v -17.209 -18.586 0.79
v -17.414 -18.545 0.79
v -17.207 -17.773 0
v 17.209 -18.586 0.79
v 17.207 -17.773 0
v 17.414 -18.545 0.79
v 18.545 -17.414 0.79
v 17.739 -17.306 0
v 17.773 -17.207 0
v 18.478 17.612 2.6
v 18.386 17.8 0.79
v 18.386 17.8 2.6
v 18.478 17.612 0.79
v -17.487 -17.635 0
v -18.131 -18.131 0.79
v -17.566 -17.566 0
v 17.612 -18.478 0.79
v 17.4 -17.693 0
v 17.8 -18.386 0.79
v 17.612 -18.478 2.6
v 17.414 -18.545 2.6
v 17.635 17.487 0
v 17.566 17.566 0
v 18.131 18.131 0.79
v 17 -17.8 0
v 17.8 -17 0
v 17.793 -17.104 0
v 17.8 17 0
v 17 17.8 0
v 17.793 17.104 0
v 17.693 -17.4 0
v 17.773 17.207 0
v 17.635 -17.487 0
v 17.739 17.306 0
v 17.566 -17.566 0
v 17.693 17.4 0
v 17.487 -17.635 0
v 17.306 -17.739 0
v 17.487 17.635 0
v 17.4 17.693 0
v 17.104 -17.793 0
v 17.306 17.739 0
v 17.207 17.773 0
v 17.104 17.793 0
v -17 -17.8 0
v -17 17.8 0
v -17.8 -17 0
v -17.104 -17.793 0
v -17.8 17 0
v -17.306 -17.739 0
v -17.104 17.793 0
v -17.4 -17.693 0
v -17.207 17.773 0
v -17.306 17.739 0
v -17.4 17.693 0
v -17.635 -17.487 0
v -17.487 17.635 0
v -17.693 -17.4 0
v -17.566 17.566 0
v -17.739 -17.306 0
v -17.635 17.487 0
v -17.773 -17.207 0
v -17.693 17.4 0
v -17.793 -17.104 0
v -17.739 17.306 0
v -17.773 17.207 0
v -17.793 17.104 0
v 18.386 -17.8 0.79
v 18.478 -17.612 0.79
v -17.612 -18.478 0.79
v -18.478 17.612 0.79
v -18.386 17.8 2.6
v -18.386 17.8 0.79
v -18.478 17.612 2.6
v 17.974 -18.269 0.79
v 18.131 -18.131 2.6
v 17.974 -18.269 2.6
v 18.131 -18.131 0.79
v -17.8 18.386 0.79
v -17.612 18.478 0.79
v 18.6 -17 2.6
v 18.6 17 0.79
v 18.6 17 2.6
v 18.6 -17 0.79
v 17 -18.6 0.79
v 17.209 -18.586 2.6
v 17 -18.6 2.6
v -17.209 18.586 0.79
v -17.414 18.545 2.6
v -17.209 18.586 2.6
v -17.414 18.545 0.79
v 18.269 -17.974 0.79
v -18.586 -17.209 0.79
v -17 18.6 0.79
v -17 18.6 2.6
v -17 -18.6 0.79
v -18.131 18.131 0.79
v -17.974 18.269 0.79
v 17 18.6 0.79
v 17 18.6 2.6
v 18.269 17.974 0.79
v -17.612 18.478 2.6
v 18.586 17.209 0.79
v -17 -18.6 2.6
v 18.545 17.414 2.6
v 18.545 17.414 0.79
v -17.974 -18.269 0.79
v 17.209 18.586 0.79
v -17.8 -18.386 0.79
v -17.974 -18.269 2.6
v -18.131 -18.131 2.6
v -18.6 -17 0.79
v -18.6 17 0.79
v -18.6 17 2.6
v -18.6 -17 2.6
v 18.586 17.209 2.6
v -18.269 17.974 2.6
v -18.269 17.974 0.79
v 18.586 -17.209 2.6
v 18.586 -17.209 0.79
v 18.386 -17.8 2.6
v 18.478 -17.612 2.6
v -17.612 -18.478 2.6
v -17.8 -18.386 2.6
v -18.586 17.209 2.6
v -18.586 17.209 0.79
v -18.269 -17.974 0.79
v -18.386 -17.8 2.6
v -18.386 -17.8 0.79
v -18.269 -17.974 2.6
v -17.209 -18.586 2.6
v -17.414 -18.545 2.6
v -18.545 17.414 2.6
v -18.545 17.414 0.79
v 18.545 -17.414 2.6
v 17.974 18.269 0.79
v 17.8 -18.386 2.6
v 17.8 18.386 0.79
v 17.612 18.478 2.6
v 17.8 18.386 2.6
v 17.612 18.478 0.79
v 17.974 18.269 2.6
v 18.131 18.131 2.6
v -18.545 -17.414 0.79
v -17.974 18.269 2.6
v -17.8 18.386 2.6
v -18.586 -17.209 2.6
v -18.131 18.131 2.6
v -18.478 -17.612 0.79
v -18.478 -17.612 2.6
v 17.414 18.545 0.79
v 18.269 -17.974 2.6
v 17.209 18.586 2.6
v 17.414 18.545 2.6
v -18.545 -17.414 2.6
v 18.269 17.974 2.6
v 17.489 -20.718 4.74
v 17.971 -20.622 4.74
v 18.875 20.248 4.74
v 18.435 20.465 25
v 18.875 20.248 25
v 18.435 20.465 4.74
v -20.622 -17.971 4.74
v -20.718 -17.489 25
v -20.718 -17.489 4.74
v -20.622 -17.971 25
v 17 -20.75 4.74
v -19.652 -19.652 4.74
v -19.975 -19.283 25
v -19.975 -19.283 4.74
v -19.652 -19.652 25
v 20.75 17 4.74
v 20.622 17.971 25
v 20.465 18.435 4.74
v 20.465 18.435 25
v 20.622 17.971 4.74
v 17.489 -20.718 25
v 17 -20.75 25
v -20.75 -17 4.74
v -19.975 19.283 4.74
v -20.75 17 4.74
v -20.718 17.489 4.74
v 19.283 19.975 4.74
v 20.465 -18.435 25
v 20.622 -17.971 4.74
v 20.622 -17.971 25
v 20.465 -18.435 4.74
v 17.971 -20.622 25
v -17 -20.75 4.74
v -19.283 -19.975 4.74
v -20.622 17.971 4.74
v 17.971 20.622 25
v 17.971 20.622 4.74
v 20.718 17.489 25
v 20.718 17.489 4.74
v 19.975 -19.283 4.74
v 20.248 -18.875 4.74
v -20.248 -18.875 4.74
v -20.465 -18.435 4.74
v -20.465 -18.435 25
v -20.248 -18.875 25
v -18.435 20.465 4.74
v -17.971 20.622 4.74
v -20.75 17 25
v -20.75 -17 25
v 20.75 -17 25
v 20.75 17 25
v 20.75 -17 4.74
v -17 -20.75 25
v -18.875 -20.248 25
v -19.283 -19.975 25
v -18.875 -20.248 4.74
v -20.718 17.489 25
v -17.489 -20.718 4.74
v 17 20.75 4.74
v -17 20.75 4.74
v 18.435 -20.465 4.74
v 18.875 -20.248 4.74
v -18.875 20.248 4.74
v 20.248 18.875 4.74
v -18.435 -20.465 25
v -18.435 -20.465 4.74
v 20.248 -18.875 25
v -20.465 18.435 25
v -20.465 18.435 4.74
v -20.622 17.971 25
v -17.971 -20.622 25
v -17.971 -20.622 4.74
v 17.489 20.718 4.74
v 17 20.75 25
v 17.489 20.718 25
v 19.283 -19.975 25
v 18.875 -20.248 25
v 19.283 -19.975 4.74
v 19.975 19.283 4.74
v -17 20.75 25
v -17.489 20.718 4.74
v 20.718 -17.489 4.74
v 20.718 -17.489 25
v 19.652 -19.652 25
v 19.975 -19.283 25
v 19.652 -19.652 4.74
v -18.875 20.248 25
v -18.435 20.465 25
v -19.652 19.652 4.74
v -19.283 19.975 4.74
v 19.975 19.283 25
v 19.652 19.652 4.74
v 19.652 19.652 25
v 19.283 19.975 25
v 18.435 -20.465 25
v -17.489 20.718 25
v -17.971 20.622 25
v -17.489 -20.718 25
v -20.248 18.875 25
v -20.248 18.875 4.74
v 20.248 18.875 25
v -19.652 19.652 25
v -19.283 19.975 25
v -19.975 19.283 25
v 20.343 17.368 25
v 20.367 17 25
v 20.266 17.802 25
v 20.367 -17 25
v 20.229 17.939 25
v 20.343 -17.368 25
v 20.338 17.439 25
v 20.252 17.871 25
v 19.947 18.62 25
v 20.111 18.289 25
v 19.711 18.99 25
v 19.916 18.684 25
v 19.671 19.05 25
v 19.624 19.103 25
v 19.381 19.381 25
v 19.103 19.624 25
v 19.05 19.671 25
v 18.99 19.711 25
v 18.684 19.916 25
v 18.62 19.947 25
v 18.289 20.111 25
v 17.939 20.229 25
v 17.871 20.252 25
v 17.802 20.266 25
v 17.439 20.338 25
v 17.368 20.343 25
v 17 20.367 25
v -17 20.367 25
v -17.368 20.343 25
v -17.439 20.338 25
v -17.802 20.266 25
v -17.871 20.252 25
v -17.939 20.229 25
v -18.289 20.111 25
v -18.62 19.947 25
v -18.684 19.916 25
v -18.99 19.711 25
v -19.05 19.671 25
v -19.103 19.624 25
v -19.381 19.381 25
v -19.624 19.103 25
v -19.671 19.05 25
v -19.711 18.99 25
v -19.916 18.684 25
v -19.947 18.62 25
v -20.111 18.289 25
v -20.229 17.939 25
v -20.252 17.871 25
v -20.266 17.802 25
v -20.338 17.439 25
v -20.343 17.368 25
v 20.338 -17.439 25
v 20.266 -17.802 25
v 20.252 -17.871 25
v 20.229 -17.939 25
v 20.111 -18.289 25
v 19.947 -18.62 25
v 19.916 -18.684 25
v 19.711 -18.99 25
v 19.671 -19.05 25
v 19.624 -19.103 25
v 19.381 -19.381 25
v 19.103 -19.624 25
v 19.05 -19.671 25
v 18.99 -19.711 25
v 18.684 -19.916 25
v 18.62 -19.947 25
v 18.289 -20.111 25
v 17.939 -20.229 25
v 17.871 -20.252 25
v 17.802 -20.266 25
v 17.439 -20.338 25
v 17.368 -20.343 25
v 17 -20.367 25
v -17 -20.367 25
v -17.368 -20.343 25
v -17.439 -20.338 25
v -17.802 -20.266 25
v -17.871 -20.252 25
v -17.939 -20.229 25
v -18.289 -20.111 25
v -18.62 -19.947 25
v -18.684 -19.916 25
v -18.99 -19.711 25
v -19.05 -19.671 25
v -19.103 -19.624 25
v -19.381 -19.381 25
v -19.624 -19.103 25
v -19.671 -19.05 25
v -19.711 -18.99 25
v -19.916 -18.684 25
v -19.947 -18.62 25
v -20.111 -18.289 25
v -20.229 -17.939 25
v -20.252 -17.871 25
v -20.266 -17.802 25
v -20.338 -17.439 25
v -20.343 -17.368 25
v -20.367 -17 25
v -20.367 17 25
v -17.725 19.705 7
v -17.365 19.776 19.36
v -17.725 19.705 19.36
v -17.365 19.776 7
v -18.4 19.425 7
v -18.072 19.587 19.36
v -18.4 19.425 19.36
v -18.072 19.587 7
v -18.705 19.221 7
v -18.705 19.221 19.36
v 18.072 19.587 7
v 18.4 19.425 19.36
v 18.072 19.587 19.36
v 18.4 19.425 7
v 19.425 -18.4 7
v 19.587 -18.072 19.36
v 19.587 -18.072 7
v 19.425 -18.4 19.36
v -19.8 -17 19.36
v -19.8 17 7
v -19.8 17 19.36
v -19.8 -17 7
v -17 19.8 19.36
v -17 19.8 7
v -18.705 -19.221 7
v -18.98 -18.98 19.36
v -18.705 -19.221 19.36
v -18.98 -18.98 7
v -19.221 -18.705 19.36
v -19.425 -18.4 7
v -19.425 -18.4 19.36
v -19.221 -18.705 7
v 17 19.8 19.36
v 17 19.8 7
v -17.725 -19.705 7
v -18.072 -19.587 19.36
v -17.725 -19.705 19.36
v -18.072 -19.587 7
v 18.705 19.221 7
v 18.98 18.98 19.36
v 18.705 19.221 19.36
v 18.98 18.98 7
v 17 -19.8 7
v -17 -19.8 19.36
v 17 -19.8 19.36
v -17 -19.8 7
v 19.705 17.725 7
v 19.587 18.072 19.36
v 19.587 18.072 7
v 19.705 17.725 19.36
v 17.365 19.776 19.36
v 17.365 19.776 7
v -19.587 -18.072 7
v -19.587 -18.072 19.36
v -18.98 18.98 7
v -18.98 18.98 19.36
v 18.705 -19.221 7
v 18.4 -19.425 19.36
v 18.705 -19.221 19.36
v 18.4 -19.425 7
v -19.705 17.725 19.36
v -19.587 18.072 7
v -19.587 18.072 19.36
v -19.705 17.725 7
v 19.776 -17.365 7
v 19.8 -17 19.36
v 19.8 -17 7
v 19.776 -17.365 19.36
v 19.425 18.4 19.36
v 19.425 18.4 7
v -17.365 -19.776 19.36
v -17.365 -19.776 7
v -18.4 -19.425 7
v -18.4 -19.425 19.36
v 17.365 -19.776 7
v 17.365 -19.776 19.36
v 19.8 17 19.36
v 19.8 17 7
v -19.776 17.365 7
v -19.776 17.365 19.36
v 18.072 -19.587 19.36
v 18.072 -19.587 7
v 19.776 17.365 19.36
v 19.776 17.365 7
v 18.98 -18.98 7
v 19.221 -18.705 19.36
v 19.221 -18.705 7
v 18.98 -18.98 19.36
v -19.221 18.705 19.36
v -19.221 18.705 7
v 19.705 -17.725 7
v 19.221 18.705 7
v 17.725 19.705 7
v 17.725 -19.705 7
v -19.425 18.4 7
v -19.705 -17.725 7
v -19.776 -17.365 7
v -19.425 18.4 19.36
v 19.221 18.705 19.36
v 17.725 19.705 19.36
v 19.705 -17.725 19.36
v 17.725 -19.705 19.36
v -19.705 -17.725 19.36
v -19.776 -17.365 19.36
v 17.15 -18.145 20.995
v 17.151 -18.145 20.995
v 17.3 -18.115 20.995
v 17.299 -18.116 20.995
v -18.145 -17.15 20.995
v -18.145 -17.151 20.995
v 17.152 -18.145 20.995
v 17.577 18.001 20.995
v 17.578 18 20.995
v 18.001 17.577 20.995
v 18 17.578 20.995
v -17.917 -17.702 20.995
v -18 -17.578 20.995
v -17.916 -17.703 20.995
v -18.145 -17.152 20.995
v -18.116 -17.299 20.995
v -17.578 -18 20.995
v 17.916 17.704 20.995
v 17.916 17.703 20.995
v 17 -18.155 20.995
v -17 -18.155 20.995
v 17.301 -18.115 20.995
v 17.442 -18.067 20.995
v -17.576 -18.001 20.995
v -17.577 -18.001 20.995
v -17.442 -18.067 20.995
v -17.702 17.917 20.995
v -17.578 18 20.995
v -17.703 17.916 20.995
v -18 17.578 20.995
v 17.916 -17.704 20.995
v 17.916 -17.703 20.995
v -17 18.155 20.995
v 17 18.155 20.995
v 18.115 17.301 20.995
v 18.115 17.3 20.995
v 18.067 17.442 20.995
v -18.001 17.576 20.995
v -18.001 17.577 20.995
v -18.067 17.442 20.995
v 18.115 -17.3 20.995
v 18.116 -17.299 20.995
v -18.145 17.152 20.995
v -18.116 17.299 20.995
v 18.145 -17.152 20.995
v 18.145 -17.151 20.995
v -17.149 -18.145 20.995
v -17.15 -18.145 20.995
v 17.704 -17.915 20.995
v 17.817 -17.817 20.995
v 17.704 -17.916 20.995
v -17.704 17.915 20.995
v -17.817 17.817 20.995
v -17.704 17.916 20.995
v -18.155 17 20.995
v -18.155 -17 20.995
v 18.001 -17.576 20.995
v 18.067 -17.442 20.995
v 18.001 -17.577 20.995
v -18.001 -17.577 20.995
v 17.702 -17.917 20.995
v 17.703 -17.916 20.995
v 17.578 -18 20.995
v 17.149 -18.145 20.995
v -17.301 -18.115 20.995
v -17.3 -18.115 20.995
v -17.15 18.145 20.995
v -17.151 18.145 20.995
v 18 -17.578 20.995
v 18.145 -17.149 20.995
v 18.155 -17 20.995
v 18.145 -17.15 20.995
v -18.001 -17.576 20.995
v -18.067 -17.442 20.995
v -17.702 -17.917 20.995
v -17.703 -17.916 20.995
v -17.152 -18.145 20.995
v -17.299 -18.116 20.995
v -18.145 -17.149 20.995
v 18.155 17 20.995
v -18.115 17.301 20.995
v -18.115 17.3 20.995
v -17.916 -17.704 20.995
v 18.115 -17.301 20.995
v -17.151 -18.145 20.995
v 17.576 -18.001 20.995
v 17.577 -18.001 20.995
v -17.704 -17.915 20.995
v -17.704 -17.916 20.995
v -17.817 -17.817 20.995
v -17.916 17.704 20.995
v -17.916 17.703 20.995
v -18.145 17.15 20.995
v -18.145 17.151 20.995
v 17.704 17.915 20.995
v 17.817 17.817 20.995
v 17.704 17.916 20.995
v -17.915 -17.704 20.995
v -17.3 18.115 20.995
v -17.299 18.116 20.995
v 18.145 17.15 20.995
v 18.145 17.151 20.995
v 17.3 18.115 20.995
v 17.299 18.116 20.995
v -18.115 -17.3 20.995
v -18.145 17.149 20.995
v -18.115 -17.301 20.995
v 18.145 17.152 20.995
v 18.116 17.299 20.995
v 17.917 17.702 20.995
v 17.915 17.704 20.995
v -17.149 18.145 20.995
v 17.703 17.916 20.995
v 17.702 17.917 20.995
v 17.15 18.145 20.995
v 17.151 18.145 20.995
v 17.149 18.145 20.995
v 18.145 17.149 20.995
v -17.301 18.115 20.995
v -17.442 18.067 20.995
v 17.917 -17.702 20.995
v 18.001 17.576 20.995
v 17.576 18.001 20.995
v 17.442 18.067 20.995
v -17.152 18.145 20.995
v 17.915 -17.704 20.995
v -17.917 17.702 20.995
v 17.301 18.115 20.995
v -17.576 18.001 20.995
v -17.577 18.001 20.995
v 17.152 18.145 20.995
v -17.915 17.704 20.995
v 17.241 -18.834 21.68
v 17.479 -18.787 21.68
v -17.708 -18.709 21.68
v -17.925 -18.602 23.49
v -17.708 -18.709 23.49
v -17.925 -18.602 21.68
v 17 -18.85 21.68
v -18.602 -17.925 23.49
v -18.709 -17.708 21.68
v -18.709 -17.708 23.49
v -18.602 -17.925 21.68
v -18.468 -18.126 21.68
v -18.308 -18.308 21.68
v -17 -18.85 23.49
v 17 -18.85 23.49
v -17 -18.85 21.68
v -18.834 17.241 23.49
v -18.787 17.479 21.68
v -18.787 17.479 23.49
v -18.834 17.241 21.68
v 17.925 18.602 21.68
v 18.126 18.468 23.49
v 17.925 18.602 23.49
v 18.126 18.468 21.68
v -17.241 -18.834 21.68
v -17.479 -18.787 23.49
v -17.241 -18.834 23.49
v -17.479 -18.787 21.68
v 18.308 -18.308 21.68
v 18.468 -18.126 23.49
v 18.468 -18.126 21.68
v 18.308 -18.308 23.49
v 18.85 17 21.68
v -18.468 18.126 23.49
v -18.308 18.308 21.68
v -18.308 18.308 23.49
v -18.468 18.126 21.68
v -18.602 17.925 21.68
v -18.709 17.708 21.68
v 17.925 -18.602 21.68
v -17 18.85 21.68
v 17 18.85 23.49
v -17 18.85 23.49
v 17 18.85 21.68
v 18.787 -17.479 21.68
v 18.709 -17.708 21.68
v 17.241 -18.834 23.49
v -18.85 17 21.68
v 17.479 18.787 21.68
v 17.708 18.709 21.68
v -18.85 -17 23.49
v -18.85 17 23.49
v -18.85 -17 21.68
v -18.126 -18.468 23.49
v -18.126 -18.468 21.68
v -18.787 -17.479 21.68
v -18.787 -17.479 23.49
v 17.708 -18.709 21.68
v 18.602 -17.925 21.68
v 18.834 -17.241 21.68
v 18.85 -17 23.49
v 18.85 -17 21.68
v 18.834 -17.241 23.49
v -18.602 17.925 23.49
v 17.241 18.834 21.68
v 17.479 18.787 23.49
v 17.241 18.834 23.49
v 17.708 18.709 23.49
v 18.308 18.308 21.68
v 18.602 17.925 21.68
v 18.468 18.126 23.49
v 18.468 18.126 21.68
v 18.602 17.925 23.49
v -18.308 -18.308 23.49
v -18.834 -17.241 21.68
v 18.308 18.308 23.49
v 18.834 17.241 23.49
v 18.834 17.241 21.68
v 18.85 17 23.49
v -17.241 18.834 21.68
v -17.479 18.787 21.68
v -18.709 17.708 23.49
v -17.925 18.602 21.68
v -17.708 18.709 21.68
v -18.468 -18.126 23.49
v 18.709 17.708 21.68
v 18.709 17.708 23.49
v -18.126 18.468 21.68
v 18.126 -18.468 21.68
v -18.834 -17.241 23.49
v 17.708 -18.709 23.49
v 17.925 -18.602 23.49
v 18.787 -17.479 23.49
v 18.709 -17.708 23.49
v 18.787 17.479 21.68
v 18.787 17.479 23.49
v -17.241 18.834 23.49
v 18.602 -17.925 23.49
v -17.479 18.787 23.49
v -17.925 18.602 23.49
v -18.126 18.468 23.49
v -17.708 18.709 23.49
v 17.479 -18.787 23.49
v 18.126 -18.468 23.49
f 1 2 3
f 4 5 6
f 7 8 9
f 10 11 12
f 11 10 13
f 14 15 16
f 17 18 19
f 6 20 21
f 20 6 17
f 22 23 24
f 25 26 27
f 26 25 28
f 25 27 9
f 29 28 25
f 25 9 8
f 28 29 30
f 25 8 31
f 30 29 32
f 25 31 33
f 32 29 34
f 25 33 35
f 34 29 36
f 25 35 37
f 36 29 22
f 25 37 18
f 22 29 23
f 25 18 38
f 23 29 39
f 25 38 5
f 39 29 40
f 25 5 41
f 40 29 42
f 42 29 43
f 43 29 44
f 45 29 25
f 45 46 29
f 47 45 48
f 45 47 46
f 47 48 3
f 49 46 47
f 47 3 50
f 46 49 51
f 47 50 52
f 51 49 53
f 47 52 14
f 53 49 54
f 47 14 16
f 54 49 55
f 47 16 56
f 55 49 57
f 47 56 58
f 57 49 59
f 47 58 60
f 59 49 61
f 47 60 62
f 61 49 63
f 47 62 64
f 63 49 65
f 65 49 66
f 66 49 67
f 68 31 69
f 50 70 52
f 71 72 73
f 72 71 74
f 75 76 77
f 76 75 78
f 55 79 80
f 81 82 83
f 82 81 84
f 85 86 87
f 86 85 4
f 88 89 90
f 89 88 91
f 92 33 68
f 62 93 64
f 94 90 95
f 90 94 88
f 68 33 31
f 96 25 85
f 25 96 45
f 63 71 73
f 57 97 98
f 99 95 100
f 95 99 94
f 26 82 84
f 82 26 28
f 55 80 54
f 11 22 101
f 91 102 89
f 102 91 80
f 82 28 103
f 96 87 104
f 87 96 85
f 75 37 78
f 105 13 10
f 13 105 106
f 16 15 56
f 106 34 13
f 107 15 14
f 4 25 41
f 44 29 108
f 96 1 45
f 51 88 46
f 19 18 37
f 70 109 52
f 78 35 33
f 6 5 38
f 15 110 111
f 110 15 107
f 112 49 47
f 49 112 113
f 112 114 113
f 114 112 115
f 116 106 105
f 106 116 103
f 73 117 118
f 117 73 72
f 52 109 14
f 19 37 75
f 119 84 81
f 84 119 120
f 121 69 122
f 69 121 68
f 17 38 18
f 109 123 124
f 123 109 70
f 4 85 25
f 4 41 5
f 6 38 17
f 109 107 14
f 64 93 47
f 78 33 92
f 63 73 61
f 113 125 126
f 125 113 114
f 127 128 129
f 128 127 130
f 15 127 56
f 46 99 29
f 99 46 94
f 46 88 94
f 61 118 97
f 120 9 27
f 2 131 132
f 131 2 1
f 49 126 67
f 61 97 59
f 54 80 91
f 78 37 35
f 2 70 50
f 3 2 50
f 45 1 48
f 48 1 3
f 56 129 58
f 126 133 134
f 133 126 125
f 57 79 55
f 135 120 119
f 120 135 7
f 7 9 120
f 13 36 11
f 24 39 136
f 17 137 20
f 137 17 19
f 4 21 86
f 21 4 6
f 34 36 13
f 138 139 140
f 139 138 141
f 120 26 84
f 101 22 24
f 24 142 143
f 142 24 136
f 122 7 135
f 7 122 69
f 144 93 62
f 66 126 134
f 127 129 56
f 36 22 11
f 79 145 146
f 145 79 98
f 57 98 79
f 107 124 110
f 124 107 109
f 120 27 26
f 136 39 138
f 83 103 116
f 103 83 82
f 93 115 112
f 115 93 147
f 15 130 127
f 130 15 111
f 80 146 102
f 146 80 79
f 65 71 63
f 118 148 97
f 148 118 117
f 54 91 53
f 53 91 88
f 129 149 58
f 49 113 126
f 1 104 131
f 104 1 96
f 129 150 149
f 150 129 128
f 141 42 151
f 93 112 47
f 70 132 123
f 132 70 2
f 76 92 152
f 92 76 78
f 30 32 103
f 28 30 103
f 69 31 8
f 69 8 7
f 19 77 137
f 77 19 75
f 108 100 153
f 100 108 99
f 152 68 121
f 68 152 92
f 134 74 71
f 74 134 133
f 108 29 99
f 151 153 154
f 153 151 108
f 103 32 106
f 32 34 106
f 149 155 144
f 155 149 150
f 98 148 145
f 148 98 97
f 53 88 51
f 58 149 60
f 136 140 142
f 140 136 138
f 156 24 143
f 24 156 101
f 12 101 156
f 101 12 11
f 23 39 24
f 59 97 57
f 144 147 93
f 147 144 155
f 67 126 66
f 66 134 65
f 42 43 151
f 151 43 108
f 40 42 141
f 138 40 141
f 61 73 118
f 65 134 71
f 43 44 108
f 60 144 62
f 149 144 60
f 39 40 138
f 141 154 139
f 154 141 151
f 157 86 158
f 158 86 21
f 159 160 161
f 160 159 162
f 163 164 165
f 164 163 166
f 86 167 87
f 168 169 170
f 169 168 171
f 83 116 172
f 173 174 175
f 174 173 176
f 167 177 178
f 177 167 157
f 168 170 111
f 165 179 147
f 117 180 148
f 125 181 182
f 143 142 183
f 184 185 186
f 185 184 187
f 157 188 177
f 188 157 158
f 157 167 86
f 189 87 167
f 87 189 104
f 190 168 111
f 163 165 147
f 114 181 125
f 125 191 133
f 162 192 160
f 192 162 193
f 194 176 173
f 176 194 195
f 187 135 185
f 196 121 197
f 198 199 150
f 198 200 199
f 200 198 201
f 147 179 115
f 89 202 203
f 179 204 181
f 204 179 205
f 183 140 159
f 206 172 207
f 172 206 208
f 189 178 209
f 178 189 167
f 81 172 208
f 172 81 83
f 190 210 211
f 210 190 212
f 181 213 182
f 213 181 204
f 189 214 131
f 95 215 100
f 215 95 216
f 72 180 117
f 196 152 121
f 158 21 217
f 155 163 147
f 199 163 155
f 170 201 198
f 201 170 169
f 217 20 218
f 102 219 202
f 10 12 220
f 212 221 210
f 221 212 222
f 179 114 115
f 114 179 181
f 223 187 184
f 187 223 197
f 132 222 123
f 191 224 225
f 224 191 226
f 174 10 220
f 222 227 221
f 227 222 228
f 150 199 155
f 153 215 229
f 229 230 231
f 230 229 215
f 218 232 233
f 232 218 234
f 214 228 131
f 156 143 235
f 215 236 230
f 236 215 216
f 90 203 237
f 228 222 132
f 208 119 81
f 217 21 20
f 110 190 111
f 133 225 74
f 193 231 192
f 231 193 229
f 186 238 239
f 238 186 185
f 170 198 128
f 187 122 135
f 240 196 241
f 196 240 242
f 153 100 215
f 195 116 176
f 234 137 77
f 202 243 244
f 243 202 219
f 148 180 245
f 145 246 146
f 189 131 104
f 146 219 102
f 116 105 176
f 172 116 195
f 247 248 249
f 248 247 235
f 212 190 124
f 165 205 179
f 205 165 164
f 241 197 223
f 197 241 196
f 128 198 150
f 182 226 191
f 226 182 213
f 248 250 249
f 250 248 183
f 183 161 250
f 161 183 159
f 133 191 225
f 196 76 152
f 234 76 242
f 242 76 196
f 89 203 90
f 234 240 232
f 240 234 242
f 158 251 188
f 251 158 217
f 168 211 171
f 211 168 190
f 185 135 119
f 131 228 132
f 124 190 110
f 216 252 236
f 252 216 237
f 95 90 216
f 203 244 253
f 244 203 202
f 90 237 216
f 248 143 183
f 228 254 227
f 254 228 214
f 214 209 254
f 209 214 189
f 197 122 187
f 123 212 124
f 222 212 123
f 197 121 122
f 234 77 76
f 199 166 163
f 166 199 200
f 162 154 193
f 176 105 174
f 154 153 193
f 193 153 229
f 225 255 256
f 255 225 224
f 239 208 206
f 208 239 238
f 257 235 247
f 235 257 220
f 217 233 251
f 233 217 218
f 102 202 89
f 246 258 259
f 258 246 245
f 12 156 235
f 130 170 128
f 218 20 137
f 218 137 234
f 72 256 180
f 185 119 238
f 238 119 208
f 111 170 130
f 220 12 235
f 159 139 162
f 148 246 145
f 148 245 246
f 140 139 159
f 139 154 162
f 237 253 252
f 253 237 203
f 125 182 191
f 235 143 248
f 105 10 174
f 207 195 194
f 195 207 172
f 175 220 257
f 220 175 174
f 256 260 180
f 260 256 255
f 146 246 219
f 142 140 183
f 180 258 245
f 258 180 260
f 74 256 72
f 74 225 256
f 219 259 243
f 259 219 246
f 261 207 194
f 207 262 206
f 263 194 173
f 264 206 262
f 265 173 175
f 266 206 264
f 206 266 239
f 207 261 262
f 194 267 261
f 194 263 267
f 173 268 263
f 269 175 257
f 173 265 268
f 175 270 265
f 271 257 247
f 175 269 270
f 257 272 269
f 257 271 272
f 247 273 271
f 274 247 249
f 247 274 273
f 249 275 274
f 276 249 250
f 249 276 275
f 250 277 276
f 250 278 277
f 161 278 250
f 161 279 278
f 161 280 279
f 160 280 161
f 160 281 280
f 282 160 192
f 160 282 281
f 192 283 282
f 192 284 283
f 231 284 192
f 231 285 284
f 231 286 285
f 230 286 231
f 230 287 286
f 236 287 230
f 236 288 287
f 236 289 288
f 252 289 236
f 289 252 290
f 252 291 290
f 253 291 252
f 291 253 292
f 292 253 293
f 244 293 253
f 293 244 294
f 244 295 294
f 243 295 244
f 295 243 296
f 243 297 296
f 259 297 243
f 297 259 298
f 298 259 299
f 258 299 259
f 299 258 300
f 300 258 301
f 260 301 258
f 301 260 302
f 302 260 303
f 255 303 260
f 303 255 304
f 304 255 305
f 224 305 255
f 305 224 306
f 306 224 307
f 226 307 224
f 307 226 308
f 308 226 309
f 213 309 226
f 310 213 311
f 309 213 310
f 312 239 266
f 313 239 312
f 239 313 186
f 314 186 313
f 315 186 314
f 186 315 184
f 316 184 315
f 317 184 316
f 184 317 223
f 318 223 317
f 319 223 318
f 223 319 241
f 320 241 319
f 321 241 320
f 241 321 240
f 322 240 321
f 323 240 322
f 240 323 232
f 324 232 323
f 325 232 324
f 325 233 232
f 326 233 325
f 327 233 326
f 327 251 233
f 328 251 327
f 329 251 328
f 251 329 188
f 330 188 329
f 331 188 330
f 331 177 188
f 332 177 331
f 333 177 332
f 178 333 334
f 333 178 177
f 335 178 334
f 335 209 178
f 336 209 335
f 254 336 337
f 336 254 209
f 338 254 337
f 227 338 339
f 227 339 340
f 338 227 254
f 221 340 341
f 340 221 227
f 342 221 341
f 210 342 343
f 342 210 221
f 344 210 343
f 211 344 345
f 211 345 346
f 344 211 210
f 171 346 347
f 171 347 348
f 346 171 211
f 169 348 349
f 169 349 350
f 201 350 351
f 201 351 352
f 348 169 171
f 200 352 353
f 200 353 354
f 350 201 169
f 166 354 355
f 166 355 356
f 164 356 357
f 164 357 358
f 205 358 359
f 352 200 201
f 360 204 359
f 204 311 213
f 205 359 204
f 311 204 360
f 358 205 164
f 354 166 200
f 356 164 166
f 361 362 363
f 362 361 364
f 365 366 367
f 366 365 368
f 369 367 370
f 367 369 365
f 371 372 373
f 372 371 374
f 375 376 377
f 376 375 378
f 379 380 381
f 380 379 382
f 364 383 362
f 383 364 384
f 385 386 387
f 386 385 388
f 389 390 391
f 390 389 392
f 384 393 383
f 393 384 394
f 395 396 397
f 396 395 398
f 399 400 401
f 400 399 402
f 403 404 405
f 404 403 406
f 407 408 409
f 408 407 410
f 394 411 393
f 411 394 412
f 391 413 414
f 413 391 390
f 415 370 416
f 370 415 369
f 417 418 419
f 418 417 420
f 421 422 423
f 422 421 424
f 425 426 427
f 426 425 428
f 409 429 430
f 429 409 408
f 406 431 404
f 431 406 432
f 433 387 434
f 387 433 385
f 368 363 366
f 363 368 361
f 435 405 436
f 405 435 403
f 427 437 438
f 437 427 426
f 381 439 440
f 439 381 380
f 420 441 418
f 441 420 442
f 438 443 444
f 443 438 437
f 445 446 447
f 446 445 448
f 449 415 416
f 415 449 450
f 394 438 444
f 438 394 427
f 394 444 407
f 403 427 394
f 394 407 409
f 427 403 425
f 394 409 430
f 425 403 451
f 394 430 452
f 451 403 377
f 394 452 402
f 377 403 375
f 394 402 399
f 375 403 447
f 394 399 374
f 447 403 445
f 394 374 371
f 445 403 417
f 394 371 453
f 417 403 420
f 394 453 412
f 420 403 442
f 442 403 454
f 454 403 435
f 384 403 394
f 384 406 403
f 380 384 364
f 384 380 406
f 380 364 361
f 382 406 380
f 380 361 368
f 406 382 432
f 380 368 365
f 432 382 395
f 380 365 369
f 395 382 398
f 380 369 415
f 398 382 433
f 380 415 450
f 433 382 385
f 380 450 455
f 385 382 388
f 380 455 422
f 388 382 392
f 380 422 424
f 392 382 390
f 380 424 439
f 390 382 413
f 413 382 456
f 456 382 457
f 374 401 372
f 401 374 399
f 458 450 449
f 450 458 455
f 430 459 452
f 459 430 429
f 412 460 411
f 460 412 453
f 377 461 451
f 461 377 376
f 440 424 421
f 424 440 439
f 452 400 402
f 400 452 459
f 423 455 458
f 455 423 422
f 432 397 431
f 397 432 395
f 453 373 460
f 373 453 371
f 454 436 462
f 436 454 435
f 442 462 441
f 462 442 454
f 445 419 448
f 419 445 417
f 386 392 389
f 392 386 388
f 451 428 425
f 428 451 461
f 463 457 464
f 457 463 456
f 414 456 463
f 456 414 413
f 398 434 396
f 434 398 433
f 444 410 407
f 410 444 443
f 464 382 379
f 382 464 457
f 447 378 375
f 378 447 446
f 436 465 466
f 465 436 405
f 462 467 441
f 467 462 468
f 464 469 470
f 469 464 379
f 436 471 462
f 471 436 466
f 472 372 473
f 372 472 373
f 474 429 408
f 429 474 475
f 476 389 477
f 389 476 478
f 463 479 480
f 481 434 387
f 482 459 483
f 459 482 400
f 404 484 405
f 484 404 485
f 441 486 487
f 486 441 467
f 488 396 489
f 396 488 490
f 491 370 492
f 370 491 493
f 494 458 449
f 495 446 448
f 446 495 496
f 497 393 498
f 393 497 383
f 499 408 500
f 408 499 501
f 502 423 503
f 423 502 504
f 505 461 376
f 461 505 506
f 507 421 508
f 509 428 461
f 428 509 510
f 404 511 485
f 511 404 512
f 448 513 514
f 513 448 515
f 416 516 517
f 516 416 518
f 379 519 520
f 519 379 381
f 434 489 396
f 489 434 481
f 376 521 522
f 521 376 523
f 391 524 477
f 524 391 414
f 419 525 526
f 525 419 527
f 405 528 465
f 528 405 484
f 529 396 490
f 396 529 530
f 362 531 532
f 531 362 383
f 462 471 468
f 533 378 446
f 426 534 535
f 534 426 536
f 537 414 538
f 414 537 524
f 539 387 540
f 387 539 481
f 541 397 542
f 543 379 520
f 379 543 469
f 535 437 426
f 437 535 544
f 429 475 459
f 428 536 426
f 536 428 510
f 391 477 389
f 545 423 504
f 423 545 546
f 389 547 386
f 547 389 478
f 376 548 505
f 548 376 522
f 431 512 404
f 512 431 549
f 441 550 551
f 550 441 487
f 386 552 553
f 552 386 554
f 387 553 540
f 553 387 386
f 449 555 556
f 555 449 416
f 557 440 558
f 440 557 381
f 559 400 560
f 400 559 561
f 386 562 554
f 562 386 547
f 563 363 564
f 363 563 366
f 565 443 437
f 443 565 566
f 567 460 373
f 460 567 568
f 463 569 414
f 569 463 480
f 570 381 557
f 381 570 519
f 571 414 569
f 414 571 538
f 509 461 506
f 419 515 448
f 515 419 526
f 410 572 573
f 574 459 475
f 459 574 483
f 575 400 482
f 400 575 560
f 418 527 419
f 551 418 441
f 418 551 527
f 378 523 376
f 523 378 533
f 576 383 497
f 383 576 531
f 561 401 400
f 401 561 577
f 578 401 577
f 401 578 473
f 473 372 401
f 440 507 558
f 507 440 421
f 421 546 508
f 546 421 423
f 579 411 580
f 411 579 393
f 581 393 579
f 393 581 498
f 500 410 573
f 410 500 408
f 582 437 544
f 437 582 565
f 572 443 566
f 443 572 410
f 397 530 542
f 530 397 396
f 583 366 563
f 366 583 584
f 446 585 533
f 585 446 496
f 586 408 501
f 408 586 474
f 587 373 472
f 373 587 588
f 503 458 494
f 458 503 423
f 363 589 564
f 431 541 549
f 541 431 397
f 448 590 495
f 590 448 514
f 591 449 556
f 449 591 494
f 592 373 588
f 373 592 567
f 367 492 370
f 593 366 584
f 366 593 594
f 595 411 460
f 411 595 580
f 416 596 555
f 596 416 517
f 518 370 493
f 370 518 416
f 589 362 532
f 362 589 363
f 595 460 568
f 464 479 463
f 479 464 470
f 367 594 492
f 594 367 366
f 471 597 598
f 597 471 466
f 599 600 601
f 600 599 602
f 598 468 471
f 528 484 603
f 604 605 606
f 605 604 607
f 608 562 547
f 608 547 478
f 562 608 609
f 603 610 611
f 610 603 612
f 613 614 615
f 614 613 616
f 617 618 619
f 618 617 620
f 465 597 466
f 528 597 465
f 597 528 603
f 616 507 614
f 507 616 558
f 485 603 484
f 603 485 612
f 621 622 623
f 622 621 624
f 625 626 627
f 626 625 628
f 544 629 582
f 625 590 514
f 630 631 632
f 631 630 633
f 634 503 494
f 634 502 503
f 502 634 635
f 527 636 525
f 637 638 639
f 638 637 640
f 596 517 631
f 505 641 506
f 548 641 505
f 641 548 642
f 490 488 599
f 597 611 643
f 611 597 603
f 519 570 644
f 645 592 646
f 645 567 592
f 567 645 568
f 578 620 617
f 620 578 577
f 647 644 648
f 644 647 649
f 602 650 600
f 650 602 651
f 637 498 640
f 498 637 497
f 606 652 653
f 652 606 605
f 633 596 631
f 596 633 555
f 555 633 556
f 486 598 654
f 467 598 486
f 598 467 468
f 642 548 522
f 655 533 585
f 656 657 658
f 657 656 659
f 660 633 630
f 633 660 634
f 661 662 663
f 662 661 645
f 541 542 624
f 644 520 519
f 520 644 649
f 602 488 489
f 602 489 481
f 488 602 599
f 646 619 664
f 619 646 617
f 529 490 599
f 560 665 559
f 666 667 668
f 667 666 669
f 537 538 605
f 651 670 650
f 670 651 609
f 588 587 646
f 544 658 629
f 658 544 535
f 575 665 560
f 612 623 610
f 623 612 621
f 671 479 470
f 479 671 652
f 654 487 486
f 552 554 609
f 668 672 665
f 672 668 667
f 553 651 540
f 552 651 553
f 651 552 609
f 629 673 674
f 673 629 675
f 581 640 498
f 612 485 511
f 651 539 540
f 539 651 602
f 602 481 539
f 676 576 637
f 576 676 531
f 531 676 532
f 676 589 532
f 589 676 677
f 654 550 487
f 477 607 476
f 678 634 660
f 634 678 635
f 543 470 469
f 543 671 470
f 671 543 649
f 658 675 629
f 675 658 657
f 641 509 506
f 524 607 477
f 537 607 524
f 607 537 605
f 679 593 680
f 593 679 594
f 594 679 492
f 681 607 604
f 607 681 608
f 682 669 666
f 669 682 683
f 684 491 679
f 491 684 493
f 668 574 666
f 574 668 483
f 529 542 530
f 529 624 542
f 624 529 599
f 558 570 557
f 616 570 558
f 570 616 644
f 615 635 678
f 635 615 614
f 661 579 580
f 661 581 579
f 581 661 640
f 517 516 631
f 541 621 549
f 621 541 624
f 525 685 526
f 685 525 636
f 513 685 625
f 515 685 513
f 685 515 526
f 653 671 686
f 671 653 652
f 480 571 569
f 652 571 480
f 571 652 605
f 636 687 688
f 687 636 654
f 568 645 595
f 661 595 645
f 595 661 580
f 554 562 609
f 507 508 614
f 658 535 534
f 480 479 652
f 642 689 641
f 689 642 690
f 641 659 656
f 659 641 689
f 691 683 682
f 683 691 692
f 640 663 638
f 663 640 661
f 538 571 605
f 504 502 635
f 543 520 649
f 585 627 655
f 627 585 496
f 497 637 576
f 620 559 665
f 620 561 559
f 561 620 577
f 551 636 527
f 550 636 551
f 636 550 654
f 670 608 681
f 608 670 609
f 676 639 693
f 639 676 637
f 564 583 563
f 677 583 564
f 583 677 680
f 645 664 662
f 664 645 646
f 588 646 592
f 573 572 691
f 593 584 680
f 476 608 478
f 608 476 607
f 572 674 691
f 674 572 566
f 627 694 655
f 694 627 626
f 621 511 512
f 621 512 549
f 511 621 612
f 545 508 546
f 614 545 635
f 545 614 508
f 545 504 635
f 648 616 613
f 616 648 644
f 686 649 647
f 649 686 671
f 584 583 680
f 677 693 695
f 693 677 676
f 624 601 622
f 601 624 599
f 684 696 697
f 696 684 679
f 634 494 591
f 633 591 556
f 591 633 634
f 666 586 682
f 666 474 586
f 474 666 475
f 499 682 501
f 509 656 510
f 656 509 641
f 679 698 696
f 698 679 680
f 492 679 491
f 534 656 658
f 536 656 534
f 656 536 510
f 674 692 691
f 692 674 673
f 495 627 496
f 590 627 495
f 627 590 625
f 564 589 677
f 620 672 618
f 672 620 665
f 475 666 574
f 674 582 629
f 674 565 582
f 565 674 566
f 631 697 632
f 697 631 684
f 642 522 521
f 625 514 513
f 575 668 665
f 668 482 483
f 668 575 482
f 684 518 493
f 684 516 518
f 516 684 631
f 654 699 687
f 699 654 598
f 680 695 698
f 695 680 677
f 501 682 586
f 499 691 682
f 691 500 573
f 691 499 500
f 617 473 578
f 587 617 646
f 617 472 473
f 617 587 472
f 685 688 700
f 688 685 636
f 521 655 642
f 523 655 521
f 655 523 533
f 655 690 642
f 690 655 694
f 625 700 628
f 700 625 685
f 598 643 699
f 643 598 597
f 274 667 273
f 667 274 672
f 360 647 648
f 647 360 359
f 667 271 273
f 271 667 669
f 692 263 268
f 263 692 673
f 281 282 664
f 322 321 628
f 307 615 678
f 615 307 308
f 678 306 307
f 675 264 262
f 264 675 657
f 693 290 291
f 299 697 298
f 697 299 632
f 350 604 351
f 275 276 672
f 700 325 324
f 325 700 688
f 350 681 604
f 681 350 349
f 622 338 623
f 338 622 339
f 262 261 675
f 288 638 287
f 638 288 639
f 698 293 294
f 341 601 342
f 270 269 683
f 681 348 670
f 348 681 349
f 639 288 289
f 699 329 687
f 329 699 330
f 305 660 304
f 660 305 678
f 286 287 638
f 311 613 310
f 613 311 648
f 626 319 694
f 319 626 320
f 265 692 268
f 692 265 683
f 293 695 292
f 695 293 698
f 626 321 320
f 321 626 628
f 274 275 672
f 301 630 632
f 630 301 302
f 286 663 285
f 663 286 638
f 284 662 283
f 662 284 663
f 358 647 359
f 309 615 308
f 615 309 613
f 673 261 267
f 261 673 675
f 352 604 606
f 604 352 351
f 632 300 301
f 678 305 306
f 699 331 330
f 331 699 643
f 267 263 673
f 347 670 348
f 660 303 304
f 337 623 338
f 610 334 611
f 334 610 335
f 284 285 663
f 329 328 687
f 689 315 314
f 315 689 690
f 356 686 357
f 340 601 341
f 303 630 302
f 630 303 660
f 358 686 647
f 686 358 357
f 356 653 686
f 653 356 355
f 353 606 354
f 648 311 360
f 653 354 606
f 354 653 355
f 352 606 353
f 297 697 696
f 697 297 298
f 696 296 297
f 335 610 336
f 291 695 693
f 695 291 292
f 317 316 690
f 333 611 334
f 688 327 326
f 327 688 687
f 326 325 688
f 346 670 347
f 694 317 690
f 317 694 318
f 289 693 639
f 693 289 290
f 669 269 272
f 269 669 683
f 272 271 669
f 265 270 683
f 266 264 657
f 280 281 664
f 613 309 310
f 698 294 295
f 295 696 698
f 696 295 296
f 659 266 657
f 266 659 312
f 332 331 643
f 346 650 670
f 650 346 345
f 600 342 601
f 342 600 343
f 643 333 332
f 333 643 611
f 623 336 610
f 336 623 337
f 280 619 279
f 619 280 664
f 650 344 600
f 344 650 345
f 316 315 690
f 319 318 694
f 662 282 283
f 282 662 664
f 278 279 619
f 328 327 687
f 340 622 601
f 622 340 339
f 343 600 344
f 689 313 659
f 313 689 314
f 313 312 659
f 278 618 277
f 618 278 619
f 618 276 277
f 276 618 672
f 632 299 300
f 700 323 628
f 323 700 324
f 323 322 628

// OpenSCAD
// file: ../lib/profile.scad
// Shared geometry: the foot and socket shapes every part is built from.
include <constants.scad>

// 2D rectangle of the given outer size with rounded corners, centred on the origin.
module rounded_rect(size, r) {
    offset(r = r) square([size.x - 2 * r, size.y - 2 * r], center = true);
}

// Solid whose outline shrinks with height according to `profile`,
// a bottom-to-top list of [z, inset from `size`]. Corner radius follows the inset.
module stepped_solid(size, r, profile) {
    for (i = [0 : len(profile) - 2]) {
        a = profile[i];
        b = profile[i + 1];
        hull() {
            translate([0, 0, a[0]])
                linear_extrude(EPS) rounded_rect(size - 2 * [a[1], a[1]], r - a[1]);
            translate([0, 0, b[0] - EPS])
                linear_extrude(EPS) rounded_rect(size - 2 * [b[1], b[1]], r - b[1]);
        }
    }
}

// One bin foot, sitting on z = 0, centred on its cell.
module foot() {
    stepped_solid([GRID - CLEARANCE, GRID - CLEARANCE], BIN_R, FOOT_PROFILE);
}

// Negative volume a foot drops into. `size` is the full grid area it spans.
// With through = true it is extended above and below so it cuts clean through a plate.
module socket(size = [GRID, GRID], through = false) {
    lo = SOCKET_PROFILE[0];
    hi = SOCKET_PROFILE[len(SOCKET_PROFILE) - 1];
    profile = through
        ? concat([[lo[0] - 1, lo[1]]], SOCKET_PROFILE, [[hi[0] + 1, hi[1]]])
        : SOCKET_PROFILE;
    stepped_solid(size, SOCKET_R, profile);
}

// Repeat children once per cell of an nx-by-ny grid centred on the origin.
module grid_copies(nx, ny) {
    for (i = [0 : nx - 1], j = [0 : ny - 1])
        translate([(i - (nx - 1) / 2) * GRID, (j - (ny - 1) / 2) * GRID, 0])
            children();
}
// file: ../lib/printer.scad
// Printer limits and the logic for splitting large parts to fit the bed.
// Values are for a Bambu Lab P2S; change them here if the printer changes.
include <constants.scad>

BED        = [256, 256, 256];   // build volume, mm
BED_MARGIN = 5;                 // space kept free at each bed edge (5 -> 5x5 cells max, 2 -> 6x6)

// Largest number of whole grid cells that fit along one bed axis (0 = X, 1 = Y).
function max_cells(axis) = floor((BED[axis] - 2 * BED_MARGIN) / GRID);

// True when a part of the given [x, y, z] size fits the bed.
function fits_bed(size) =
    size.x <= BED.x - 2 * BED_MARGIN &&
    size.y <= BED.y - 2 * BED_MARGIN &&
    (len(size) < 3 || size.z <= BED.z);

// Split n cells into the fewest runs of at most `limit` cells, as evenly as possible.
// split_cells(13, 5) -> [5, 4, 4]
function split_cells(n, limit) =
    let (count = ceil(n / limit), base = floor(n / count), extra = n - base * count)
    [for (i = [0 : count - 1]) base + (i < extra ? 1 : 0)];

// Sum of the first `count` entries of a list.
function sum_first(v, count) = count <= 0 ? 0 : v[count - 1] + sum_first(v, count - 1);
// file: ../lib/constants.scad
// Gridfinity standard dimensions (mm). Single source of truth:
// every other file includes this one and never hardcodes these numbers.

GRID      = 42;     // X/Y pitch of one cell
UNIT_Z    = 7;      // height of one "u"
CLEARANCE = 0.5;    // total X/Y gap between a bin and its grid space (0.25 per side)

// Bin foot: stepped chamfer, listed bottom to top as [z, inset from the foot's top outline].
FOOT_PROFILE = [[0, 2.95], [0.8, 2.15], [2.6, 2.15], [4.75, 0]];
FOOT_H       = 4.75;
BIN_R        = 3.75;   // outer corner radius of a bin

// Socket (baseplate cell and stacking lip): [z, inset from the 42 mm grid outline].
SOCKET_PROFILE = [[0, 2.85], [0.7, 2.15], [2.5, 2.15], [4.65, 0]];
SOCKET_H       = 4.65;
SOCKET_R       = 4;    // corner radius at the top of a socket

// Bin body
WALL      = 0.95;   // wall thickness
FLOOR_Z   = 7;      // top of the bin floor, measured from the bottom of the foot
LIP_H     = 4.4;    // nominal stacking-lip height above the bin body
LIP_TRIM  = 0.4;    // shave the knife edge off the lip tip so it prints cleanly
LIP_INSET = SOCKET_PROFILE[0][1] - CLEARANCE / 2;   // lip overhang from the outer wall (2.6)

// Magnets (optional)
MAGNET_D      = 6.5;
MAGNET_H      = 2.4;
MAGNET_OFFSET = 13;   // hole centre distance from the cell centre, in X and Y

EPS = 0.01;   // overlap used to avoid coincident faces in boolean cuts
$fn = 48;
// main file
// Basic Gridfinity bin: one foot per cell, a hollow body and an optional stacking lip.
include <../lib/constants.scad>
include <../lib/printer.scad>
use <../lib/profile.scad>

/* [Bin] */
cells_x = 1;
cells_y = 1;
units_z = 3;       // height in 7 mm units, lip not included
lip     = true;    // stacking lip on top
magnets = false;   // magnet holes under each foot

assert(fits_bed([cells_x * GRID, cells_y * GRID, units_z * UNIT_Z + LIP_H]),
       "Bin is larger than the printer bed");

bin(cells_x, cells_y, units_z, lip, magnets);

module bin(nx = 1, ny = 1, uz = 3, lip = true, magnets = false) {
    assert(uz >= 2, "A bin needs at least 2 height units to have a cavity");

    outer = [nx * GRID - CLEARANCE, ny * GRID - CLEARANCE];
    top   = uz * UNIT_Z;
    lip_h = lip ? LIP_H - LIP_TRIM : 0;

    render(convexity = 4) difference() {
        union() {
            grid_copies(nx, ny) foot();
            translate([0, 0, FOOT_H - EPS])
                linear_extrude(top - FOOT_H + lip_h + EPS) rounded_rect(outer, BIN_R);
        }

        if (lip) {
            // Cavity narrows at 45 degrees under the lip so the overhang prints without support.
            stepped_solid(outer, BIN_R, [
                [FLOOR_Z, WALL],
                [top - (LIP_INSET - WALL), WALL],
                [top, LIP_INSET],
            ]);
            // The lip is the baseplate socket, so a bin stacks exactly as it sits on a plate.
            translate([0, 0, top - EPS]) socket([nx * GRID, ny * GRID]);
        } else {
            stepped_solid(outer, BIN_R, [[FLOOR_Z, WALL], [top + 1, WALL]]);
        }

        if (magnets)
            grid_copies(nx, ny)
                for (sx = [-1, 1], sy = [-1, 1])
                    translate([sx * MAGNET_OFFSET, sy * MAGNET_OFFSET, -EPS])
                        cylinder(d = MAGNET_D, h = MAGNET_H + EPS);
    }
}
